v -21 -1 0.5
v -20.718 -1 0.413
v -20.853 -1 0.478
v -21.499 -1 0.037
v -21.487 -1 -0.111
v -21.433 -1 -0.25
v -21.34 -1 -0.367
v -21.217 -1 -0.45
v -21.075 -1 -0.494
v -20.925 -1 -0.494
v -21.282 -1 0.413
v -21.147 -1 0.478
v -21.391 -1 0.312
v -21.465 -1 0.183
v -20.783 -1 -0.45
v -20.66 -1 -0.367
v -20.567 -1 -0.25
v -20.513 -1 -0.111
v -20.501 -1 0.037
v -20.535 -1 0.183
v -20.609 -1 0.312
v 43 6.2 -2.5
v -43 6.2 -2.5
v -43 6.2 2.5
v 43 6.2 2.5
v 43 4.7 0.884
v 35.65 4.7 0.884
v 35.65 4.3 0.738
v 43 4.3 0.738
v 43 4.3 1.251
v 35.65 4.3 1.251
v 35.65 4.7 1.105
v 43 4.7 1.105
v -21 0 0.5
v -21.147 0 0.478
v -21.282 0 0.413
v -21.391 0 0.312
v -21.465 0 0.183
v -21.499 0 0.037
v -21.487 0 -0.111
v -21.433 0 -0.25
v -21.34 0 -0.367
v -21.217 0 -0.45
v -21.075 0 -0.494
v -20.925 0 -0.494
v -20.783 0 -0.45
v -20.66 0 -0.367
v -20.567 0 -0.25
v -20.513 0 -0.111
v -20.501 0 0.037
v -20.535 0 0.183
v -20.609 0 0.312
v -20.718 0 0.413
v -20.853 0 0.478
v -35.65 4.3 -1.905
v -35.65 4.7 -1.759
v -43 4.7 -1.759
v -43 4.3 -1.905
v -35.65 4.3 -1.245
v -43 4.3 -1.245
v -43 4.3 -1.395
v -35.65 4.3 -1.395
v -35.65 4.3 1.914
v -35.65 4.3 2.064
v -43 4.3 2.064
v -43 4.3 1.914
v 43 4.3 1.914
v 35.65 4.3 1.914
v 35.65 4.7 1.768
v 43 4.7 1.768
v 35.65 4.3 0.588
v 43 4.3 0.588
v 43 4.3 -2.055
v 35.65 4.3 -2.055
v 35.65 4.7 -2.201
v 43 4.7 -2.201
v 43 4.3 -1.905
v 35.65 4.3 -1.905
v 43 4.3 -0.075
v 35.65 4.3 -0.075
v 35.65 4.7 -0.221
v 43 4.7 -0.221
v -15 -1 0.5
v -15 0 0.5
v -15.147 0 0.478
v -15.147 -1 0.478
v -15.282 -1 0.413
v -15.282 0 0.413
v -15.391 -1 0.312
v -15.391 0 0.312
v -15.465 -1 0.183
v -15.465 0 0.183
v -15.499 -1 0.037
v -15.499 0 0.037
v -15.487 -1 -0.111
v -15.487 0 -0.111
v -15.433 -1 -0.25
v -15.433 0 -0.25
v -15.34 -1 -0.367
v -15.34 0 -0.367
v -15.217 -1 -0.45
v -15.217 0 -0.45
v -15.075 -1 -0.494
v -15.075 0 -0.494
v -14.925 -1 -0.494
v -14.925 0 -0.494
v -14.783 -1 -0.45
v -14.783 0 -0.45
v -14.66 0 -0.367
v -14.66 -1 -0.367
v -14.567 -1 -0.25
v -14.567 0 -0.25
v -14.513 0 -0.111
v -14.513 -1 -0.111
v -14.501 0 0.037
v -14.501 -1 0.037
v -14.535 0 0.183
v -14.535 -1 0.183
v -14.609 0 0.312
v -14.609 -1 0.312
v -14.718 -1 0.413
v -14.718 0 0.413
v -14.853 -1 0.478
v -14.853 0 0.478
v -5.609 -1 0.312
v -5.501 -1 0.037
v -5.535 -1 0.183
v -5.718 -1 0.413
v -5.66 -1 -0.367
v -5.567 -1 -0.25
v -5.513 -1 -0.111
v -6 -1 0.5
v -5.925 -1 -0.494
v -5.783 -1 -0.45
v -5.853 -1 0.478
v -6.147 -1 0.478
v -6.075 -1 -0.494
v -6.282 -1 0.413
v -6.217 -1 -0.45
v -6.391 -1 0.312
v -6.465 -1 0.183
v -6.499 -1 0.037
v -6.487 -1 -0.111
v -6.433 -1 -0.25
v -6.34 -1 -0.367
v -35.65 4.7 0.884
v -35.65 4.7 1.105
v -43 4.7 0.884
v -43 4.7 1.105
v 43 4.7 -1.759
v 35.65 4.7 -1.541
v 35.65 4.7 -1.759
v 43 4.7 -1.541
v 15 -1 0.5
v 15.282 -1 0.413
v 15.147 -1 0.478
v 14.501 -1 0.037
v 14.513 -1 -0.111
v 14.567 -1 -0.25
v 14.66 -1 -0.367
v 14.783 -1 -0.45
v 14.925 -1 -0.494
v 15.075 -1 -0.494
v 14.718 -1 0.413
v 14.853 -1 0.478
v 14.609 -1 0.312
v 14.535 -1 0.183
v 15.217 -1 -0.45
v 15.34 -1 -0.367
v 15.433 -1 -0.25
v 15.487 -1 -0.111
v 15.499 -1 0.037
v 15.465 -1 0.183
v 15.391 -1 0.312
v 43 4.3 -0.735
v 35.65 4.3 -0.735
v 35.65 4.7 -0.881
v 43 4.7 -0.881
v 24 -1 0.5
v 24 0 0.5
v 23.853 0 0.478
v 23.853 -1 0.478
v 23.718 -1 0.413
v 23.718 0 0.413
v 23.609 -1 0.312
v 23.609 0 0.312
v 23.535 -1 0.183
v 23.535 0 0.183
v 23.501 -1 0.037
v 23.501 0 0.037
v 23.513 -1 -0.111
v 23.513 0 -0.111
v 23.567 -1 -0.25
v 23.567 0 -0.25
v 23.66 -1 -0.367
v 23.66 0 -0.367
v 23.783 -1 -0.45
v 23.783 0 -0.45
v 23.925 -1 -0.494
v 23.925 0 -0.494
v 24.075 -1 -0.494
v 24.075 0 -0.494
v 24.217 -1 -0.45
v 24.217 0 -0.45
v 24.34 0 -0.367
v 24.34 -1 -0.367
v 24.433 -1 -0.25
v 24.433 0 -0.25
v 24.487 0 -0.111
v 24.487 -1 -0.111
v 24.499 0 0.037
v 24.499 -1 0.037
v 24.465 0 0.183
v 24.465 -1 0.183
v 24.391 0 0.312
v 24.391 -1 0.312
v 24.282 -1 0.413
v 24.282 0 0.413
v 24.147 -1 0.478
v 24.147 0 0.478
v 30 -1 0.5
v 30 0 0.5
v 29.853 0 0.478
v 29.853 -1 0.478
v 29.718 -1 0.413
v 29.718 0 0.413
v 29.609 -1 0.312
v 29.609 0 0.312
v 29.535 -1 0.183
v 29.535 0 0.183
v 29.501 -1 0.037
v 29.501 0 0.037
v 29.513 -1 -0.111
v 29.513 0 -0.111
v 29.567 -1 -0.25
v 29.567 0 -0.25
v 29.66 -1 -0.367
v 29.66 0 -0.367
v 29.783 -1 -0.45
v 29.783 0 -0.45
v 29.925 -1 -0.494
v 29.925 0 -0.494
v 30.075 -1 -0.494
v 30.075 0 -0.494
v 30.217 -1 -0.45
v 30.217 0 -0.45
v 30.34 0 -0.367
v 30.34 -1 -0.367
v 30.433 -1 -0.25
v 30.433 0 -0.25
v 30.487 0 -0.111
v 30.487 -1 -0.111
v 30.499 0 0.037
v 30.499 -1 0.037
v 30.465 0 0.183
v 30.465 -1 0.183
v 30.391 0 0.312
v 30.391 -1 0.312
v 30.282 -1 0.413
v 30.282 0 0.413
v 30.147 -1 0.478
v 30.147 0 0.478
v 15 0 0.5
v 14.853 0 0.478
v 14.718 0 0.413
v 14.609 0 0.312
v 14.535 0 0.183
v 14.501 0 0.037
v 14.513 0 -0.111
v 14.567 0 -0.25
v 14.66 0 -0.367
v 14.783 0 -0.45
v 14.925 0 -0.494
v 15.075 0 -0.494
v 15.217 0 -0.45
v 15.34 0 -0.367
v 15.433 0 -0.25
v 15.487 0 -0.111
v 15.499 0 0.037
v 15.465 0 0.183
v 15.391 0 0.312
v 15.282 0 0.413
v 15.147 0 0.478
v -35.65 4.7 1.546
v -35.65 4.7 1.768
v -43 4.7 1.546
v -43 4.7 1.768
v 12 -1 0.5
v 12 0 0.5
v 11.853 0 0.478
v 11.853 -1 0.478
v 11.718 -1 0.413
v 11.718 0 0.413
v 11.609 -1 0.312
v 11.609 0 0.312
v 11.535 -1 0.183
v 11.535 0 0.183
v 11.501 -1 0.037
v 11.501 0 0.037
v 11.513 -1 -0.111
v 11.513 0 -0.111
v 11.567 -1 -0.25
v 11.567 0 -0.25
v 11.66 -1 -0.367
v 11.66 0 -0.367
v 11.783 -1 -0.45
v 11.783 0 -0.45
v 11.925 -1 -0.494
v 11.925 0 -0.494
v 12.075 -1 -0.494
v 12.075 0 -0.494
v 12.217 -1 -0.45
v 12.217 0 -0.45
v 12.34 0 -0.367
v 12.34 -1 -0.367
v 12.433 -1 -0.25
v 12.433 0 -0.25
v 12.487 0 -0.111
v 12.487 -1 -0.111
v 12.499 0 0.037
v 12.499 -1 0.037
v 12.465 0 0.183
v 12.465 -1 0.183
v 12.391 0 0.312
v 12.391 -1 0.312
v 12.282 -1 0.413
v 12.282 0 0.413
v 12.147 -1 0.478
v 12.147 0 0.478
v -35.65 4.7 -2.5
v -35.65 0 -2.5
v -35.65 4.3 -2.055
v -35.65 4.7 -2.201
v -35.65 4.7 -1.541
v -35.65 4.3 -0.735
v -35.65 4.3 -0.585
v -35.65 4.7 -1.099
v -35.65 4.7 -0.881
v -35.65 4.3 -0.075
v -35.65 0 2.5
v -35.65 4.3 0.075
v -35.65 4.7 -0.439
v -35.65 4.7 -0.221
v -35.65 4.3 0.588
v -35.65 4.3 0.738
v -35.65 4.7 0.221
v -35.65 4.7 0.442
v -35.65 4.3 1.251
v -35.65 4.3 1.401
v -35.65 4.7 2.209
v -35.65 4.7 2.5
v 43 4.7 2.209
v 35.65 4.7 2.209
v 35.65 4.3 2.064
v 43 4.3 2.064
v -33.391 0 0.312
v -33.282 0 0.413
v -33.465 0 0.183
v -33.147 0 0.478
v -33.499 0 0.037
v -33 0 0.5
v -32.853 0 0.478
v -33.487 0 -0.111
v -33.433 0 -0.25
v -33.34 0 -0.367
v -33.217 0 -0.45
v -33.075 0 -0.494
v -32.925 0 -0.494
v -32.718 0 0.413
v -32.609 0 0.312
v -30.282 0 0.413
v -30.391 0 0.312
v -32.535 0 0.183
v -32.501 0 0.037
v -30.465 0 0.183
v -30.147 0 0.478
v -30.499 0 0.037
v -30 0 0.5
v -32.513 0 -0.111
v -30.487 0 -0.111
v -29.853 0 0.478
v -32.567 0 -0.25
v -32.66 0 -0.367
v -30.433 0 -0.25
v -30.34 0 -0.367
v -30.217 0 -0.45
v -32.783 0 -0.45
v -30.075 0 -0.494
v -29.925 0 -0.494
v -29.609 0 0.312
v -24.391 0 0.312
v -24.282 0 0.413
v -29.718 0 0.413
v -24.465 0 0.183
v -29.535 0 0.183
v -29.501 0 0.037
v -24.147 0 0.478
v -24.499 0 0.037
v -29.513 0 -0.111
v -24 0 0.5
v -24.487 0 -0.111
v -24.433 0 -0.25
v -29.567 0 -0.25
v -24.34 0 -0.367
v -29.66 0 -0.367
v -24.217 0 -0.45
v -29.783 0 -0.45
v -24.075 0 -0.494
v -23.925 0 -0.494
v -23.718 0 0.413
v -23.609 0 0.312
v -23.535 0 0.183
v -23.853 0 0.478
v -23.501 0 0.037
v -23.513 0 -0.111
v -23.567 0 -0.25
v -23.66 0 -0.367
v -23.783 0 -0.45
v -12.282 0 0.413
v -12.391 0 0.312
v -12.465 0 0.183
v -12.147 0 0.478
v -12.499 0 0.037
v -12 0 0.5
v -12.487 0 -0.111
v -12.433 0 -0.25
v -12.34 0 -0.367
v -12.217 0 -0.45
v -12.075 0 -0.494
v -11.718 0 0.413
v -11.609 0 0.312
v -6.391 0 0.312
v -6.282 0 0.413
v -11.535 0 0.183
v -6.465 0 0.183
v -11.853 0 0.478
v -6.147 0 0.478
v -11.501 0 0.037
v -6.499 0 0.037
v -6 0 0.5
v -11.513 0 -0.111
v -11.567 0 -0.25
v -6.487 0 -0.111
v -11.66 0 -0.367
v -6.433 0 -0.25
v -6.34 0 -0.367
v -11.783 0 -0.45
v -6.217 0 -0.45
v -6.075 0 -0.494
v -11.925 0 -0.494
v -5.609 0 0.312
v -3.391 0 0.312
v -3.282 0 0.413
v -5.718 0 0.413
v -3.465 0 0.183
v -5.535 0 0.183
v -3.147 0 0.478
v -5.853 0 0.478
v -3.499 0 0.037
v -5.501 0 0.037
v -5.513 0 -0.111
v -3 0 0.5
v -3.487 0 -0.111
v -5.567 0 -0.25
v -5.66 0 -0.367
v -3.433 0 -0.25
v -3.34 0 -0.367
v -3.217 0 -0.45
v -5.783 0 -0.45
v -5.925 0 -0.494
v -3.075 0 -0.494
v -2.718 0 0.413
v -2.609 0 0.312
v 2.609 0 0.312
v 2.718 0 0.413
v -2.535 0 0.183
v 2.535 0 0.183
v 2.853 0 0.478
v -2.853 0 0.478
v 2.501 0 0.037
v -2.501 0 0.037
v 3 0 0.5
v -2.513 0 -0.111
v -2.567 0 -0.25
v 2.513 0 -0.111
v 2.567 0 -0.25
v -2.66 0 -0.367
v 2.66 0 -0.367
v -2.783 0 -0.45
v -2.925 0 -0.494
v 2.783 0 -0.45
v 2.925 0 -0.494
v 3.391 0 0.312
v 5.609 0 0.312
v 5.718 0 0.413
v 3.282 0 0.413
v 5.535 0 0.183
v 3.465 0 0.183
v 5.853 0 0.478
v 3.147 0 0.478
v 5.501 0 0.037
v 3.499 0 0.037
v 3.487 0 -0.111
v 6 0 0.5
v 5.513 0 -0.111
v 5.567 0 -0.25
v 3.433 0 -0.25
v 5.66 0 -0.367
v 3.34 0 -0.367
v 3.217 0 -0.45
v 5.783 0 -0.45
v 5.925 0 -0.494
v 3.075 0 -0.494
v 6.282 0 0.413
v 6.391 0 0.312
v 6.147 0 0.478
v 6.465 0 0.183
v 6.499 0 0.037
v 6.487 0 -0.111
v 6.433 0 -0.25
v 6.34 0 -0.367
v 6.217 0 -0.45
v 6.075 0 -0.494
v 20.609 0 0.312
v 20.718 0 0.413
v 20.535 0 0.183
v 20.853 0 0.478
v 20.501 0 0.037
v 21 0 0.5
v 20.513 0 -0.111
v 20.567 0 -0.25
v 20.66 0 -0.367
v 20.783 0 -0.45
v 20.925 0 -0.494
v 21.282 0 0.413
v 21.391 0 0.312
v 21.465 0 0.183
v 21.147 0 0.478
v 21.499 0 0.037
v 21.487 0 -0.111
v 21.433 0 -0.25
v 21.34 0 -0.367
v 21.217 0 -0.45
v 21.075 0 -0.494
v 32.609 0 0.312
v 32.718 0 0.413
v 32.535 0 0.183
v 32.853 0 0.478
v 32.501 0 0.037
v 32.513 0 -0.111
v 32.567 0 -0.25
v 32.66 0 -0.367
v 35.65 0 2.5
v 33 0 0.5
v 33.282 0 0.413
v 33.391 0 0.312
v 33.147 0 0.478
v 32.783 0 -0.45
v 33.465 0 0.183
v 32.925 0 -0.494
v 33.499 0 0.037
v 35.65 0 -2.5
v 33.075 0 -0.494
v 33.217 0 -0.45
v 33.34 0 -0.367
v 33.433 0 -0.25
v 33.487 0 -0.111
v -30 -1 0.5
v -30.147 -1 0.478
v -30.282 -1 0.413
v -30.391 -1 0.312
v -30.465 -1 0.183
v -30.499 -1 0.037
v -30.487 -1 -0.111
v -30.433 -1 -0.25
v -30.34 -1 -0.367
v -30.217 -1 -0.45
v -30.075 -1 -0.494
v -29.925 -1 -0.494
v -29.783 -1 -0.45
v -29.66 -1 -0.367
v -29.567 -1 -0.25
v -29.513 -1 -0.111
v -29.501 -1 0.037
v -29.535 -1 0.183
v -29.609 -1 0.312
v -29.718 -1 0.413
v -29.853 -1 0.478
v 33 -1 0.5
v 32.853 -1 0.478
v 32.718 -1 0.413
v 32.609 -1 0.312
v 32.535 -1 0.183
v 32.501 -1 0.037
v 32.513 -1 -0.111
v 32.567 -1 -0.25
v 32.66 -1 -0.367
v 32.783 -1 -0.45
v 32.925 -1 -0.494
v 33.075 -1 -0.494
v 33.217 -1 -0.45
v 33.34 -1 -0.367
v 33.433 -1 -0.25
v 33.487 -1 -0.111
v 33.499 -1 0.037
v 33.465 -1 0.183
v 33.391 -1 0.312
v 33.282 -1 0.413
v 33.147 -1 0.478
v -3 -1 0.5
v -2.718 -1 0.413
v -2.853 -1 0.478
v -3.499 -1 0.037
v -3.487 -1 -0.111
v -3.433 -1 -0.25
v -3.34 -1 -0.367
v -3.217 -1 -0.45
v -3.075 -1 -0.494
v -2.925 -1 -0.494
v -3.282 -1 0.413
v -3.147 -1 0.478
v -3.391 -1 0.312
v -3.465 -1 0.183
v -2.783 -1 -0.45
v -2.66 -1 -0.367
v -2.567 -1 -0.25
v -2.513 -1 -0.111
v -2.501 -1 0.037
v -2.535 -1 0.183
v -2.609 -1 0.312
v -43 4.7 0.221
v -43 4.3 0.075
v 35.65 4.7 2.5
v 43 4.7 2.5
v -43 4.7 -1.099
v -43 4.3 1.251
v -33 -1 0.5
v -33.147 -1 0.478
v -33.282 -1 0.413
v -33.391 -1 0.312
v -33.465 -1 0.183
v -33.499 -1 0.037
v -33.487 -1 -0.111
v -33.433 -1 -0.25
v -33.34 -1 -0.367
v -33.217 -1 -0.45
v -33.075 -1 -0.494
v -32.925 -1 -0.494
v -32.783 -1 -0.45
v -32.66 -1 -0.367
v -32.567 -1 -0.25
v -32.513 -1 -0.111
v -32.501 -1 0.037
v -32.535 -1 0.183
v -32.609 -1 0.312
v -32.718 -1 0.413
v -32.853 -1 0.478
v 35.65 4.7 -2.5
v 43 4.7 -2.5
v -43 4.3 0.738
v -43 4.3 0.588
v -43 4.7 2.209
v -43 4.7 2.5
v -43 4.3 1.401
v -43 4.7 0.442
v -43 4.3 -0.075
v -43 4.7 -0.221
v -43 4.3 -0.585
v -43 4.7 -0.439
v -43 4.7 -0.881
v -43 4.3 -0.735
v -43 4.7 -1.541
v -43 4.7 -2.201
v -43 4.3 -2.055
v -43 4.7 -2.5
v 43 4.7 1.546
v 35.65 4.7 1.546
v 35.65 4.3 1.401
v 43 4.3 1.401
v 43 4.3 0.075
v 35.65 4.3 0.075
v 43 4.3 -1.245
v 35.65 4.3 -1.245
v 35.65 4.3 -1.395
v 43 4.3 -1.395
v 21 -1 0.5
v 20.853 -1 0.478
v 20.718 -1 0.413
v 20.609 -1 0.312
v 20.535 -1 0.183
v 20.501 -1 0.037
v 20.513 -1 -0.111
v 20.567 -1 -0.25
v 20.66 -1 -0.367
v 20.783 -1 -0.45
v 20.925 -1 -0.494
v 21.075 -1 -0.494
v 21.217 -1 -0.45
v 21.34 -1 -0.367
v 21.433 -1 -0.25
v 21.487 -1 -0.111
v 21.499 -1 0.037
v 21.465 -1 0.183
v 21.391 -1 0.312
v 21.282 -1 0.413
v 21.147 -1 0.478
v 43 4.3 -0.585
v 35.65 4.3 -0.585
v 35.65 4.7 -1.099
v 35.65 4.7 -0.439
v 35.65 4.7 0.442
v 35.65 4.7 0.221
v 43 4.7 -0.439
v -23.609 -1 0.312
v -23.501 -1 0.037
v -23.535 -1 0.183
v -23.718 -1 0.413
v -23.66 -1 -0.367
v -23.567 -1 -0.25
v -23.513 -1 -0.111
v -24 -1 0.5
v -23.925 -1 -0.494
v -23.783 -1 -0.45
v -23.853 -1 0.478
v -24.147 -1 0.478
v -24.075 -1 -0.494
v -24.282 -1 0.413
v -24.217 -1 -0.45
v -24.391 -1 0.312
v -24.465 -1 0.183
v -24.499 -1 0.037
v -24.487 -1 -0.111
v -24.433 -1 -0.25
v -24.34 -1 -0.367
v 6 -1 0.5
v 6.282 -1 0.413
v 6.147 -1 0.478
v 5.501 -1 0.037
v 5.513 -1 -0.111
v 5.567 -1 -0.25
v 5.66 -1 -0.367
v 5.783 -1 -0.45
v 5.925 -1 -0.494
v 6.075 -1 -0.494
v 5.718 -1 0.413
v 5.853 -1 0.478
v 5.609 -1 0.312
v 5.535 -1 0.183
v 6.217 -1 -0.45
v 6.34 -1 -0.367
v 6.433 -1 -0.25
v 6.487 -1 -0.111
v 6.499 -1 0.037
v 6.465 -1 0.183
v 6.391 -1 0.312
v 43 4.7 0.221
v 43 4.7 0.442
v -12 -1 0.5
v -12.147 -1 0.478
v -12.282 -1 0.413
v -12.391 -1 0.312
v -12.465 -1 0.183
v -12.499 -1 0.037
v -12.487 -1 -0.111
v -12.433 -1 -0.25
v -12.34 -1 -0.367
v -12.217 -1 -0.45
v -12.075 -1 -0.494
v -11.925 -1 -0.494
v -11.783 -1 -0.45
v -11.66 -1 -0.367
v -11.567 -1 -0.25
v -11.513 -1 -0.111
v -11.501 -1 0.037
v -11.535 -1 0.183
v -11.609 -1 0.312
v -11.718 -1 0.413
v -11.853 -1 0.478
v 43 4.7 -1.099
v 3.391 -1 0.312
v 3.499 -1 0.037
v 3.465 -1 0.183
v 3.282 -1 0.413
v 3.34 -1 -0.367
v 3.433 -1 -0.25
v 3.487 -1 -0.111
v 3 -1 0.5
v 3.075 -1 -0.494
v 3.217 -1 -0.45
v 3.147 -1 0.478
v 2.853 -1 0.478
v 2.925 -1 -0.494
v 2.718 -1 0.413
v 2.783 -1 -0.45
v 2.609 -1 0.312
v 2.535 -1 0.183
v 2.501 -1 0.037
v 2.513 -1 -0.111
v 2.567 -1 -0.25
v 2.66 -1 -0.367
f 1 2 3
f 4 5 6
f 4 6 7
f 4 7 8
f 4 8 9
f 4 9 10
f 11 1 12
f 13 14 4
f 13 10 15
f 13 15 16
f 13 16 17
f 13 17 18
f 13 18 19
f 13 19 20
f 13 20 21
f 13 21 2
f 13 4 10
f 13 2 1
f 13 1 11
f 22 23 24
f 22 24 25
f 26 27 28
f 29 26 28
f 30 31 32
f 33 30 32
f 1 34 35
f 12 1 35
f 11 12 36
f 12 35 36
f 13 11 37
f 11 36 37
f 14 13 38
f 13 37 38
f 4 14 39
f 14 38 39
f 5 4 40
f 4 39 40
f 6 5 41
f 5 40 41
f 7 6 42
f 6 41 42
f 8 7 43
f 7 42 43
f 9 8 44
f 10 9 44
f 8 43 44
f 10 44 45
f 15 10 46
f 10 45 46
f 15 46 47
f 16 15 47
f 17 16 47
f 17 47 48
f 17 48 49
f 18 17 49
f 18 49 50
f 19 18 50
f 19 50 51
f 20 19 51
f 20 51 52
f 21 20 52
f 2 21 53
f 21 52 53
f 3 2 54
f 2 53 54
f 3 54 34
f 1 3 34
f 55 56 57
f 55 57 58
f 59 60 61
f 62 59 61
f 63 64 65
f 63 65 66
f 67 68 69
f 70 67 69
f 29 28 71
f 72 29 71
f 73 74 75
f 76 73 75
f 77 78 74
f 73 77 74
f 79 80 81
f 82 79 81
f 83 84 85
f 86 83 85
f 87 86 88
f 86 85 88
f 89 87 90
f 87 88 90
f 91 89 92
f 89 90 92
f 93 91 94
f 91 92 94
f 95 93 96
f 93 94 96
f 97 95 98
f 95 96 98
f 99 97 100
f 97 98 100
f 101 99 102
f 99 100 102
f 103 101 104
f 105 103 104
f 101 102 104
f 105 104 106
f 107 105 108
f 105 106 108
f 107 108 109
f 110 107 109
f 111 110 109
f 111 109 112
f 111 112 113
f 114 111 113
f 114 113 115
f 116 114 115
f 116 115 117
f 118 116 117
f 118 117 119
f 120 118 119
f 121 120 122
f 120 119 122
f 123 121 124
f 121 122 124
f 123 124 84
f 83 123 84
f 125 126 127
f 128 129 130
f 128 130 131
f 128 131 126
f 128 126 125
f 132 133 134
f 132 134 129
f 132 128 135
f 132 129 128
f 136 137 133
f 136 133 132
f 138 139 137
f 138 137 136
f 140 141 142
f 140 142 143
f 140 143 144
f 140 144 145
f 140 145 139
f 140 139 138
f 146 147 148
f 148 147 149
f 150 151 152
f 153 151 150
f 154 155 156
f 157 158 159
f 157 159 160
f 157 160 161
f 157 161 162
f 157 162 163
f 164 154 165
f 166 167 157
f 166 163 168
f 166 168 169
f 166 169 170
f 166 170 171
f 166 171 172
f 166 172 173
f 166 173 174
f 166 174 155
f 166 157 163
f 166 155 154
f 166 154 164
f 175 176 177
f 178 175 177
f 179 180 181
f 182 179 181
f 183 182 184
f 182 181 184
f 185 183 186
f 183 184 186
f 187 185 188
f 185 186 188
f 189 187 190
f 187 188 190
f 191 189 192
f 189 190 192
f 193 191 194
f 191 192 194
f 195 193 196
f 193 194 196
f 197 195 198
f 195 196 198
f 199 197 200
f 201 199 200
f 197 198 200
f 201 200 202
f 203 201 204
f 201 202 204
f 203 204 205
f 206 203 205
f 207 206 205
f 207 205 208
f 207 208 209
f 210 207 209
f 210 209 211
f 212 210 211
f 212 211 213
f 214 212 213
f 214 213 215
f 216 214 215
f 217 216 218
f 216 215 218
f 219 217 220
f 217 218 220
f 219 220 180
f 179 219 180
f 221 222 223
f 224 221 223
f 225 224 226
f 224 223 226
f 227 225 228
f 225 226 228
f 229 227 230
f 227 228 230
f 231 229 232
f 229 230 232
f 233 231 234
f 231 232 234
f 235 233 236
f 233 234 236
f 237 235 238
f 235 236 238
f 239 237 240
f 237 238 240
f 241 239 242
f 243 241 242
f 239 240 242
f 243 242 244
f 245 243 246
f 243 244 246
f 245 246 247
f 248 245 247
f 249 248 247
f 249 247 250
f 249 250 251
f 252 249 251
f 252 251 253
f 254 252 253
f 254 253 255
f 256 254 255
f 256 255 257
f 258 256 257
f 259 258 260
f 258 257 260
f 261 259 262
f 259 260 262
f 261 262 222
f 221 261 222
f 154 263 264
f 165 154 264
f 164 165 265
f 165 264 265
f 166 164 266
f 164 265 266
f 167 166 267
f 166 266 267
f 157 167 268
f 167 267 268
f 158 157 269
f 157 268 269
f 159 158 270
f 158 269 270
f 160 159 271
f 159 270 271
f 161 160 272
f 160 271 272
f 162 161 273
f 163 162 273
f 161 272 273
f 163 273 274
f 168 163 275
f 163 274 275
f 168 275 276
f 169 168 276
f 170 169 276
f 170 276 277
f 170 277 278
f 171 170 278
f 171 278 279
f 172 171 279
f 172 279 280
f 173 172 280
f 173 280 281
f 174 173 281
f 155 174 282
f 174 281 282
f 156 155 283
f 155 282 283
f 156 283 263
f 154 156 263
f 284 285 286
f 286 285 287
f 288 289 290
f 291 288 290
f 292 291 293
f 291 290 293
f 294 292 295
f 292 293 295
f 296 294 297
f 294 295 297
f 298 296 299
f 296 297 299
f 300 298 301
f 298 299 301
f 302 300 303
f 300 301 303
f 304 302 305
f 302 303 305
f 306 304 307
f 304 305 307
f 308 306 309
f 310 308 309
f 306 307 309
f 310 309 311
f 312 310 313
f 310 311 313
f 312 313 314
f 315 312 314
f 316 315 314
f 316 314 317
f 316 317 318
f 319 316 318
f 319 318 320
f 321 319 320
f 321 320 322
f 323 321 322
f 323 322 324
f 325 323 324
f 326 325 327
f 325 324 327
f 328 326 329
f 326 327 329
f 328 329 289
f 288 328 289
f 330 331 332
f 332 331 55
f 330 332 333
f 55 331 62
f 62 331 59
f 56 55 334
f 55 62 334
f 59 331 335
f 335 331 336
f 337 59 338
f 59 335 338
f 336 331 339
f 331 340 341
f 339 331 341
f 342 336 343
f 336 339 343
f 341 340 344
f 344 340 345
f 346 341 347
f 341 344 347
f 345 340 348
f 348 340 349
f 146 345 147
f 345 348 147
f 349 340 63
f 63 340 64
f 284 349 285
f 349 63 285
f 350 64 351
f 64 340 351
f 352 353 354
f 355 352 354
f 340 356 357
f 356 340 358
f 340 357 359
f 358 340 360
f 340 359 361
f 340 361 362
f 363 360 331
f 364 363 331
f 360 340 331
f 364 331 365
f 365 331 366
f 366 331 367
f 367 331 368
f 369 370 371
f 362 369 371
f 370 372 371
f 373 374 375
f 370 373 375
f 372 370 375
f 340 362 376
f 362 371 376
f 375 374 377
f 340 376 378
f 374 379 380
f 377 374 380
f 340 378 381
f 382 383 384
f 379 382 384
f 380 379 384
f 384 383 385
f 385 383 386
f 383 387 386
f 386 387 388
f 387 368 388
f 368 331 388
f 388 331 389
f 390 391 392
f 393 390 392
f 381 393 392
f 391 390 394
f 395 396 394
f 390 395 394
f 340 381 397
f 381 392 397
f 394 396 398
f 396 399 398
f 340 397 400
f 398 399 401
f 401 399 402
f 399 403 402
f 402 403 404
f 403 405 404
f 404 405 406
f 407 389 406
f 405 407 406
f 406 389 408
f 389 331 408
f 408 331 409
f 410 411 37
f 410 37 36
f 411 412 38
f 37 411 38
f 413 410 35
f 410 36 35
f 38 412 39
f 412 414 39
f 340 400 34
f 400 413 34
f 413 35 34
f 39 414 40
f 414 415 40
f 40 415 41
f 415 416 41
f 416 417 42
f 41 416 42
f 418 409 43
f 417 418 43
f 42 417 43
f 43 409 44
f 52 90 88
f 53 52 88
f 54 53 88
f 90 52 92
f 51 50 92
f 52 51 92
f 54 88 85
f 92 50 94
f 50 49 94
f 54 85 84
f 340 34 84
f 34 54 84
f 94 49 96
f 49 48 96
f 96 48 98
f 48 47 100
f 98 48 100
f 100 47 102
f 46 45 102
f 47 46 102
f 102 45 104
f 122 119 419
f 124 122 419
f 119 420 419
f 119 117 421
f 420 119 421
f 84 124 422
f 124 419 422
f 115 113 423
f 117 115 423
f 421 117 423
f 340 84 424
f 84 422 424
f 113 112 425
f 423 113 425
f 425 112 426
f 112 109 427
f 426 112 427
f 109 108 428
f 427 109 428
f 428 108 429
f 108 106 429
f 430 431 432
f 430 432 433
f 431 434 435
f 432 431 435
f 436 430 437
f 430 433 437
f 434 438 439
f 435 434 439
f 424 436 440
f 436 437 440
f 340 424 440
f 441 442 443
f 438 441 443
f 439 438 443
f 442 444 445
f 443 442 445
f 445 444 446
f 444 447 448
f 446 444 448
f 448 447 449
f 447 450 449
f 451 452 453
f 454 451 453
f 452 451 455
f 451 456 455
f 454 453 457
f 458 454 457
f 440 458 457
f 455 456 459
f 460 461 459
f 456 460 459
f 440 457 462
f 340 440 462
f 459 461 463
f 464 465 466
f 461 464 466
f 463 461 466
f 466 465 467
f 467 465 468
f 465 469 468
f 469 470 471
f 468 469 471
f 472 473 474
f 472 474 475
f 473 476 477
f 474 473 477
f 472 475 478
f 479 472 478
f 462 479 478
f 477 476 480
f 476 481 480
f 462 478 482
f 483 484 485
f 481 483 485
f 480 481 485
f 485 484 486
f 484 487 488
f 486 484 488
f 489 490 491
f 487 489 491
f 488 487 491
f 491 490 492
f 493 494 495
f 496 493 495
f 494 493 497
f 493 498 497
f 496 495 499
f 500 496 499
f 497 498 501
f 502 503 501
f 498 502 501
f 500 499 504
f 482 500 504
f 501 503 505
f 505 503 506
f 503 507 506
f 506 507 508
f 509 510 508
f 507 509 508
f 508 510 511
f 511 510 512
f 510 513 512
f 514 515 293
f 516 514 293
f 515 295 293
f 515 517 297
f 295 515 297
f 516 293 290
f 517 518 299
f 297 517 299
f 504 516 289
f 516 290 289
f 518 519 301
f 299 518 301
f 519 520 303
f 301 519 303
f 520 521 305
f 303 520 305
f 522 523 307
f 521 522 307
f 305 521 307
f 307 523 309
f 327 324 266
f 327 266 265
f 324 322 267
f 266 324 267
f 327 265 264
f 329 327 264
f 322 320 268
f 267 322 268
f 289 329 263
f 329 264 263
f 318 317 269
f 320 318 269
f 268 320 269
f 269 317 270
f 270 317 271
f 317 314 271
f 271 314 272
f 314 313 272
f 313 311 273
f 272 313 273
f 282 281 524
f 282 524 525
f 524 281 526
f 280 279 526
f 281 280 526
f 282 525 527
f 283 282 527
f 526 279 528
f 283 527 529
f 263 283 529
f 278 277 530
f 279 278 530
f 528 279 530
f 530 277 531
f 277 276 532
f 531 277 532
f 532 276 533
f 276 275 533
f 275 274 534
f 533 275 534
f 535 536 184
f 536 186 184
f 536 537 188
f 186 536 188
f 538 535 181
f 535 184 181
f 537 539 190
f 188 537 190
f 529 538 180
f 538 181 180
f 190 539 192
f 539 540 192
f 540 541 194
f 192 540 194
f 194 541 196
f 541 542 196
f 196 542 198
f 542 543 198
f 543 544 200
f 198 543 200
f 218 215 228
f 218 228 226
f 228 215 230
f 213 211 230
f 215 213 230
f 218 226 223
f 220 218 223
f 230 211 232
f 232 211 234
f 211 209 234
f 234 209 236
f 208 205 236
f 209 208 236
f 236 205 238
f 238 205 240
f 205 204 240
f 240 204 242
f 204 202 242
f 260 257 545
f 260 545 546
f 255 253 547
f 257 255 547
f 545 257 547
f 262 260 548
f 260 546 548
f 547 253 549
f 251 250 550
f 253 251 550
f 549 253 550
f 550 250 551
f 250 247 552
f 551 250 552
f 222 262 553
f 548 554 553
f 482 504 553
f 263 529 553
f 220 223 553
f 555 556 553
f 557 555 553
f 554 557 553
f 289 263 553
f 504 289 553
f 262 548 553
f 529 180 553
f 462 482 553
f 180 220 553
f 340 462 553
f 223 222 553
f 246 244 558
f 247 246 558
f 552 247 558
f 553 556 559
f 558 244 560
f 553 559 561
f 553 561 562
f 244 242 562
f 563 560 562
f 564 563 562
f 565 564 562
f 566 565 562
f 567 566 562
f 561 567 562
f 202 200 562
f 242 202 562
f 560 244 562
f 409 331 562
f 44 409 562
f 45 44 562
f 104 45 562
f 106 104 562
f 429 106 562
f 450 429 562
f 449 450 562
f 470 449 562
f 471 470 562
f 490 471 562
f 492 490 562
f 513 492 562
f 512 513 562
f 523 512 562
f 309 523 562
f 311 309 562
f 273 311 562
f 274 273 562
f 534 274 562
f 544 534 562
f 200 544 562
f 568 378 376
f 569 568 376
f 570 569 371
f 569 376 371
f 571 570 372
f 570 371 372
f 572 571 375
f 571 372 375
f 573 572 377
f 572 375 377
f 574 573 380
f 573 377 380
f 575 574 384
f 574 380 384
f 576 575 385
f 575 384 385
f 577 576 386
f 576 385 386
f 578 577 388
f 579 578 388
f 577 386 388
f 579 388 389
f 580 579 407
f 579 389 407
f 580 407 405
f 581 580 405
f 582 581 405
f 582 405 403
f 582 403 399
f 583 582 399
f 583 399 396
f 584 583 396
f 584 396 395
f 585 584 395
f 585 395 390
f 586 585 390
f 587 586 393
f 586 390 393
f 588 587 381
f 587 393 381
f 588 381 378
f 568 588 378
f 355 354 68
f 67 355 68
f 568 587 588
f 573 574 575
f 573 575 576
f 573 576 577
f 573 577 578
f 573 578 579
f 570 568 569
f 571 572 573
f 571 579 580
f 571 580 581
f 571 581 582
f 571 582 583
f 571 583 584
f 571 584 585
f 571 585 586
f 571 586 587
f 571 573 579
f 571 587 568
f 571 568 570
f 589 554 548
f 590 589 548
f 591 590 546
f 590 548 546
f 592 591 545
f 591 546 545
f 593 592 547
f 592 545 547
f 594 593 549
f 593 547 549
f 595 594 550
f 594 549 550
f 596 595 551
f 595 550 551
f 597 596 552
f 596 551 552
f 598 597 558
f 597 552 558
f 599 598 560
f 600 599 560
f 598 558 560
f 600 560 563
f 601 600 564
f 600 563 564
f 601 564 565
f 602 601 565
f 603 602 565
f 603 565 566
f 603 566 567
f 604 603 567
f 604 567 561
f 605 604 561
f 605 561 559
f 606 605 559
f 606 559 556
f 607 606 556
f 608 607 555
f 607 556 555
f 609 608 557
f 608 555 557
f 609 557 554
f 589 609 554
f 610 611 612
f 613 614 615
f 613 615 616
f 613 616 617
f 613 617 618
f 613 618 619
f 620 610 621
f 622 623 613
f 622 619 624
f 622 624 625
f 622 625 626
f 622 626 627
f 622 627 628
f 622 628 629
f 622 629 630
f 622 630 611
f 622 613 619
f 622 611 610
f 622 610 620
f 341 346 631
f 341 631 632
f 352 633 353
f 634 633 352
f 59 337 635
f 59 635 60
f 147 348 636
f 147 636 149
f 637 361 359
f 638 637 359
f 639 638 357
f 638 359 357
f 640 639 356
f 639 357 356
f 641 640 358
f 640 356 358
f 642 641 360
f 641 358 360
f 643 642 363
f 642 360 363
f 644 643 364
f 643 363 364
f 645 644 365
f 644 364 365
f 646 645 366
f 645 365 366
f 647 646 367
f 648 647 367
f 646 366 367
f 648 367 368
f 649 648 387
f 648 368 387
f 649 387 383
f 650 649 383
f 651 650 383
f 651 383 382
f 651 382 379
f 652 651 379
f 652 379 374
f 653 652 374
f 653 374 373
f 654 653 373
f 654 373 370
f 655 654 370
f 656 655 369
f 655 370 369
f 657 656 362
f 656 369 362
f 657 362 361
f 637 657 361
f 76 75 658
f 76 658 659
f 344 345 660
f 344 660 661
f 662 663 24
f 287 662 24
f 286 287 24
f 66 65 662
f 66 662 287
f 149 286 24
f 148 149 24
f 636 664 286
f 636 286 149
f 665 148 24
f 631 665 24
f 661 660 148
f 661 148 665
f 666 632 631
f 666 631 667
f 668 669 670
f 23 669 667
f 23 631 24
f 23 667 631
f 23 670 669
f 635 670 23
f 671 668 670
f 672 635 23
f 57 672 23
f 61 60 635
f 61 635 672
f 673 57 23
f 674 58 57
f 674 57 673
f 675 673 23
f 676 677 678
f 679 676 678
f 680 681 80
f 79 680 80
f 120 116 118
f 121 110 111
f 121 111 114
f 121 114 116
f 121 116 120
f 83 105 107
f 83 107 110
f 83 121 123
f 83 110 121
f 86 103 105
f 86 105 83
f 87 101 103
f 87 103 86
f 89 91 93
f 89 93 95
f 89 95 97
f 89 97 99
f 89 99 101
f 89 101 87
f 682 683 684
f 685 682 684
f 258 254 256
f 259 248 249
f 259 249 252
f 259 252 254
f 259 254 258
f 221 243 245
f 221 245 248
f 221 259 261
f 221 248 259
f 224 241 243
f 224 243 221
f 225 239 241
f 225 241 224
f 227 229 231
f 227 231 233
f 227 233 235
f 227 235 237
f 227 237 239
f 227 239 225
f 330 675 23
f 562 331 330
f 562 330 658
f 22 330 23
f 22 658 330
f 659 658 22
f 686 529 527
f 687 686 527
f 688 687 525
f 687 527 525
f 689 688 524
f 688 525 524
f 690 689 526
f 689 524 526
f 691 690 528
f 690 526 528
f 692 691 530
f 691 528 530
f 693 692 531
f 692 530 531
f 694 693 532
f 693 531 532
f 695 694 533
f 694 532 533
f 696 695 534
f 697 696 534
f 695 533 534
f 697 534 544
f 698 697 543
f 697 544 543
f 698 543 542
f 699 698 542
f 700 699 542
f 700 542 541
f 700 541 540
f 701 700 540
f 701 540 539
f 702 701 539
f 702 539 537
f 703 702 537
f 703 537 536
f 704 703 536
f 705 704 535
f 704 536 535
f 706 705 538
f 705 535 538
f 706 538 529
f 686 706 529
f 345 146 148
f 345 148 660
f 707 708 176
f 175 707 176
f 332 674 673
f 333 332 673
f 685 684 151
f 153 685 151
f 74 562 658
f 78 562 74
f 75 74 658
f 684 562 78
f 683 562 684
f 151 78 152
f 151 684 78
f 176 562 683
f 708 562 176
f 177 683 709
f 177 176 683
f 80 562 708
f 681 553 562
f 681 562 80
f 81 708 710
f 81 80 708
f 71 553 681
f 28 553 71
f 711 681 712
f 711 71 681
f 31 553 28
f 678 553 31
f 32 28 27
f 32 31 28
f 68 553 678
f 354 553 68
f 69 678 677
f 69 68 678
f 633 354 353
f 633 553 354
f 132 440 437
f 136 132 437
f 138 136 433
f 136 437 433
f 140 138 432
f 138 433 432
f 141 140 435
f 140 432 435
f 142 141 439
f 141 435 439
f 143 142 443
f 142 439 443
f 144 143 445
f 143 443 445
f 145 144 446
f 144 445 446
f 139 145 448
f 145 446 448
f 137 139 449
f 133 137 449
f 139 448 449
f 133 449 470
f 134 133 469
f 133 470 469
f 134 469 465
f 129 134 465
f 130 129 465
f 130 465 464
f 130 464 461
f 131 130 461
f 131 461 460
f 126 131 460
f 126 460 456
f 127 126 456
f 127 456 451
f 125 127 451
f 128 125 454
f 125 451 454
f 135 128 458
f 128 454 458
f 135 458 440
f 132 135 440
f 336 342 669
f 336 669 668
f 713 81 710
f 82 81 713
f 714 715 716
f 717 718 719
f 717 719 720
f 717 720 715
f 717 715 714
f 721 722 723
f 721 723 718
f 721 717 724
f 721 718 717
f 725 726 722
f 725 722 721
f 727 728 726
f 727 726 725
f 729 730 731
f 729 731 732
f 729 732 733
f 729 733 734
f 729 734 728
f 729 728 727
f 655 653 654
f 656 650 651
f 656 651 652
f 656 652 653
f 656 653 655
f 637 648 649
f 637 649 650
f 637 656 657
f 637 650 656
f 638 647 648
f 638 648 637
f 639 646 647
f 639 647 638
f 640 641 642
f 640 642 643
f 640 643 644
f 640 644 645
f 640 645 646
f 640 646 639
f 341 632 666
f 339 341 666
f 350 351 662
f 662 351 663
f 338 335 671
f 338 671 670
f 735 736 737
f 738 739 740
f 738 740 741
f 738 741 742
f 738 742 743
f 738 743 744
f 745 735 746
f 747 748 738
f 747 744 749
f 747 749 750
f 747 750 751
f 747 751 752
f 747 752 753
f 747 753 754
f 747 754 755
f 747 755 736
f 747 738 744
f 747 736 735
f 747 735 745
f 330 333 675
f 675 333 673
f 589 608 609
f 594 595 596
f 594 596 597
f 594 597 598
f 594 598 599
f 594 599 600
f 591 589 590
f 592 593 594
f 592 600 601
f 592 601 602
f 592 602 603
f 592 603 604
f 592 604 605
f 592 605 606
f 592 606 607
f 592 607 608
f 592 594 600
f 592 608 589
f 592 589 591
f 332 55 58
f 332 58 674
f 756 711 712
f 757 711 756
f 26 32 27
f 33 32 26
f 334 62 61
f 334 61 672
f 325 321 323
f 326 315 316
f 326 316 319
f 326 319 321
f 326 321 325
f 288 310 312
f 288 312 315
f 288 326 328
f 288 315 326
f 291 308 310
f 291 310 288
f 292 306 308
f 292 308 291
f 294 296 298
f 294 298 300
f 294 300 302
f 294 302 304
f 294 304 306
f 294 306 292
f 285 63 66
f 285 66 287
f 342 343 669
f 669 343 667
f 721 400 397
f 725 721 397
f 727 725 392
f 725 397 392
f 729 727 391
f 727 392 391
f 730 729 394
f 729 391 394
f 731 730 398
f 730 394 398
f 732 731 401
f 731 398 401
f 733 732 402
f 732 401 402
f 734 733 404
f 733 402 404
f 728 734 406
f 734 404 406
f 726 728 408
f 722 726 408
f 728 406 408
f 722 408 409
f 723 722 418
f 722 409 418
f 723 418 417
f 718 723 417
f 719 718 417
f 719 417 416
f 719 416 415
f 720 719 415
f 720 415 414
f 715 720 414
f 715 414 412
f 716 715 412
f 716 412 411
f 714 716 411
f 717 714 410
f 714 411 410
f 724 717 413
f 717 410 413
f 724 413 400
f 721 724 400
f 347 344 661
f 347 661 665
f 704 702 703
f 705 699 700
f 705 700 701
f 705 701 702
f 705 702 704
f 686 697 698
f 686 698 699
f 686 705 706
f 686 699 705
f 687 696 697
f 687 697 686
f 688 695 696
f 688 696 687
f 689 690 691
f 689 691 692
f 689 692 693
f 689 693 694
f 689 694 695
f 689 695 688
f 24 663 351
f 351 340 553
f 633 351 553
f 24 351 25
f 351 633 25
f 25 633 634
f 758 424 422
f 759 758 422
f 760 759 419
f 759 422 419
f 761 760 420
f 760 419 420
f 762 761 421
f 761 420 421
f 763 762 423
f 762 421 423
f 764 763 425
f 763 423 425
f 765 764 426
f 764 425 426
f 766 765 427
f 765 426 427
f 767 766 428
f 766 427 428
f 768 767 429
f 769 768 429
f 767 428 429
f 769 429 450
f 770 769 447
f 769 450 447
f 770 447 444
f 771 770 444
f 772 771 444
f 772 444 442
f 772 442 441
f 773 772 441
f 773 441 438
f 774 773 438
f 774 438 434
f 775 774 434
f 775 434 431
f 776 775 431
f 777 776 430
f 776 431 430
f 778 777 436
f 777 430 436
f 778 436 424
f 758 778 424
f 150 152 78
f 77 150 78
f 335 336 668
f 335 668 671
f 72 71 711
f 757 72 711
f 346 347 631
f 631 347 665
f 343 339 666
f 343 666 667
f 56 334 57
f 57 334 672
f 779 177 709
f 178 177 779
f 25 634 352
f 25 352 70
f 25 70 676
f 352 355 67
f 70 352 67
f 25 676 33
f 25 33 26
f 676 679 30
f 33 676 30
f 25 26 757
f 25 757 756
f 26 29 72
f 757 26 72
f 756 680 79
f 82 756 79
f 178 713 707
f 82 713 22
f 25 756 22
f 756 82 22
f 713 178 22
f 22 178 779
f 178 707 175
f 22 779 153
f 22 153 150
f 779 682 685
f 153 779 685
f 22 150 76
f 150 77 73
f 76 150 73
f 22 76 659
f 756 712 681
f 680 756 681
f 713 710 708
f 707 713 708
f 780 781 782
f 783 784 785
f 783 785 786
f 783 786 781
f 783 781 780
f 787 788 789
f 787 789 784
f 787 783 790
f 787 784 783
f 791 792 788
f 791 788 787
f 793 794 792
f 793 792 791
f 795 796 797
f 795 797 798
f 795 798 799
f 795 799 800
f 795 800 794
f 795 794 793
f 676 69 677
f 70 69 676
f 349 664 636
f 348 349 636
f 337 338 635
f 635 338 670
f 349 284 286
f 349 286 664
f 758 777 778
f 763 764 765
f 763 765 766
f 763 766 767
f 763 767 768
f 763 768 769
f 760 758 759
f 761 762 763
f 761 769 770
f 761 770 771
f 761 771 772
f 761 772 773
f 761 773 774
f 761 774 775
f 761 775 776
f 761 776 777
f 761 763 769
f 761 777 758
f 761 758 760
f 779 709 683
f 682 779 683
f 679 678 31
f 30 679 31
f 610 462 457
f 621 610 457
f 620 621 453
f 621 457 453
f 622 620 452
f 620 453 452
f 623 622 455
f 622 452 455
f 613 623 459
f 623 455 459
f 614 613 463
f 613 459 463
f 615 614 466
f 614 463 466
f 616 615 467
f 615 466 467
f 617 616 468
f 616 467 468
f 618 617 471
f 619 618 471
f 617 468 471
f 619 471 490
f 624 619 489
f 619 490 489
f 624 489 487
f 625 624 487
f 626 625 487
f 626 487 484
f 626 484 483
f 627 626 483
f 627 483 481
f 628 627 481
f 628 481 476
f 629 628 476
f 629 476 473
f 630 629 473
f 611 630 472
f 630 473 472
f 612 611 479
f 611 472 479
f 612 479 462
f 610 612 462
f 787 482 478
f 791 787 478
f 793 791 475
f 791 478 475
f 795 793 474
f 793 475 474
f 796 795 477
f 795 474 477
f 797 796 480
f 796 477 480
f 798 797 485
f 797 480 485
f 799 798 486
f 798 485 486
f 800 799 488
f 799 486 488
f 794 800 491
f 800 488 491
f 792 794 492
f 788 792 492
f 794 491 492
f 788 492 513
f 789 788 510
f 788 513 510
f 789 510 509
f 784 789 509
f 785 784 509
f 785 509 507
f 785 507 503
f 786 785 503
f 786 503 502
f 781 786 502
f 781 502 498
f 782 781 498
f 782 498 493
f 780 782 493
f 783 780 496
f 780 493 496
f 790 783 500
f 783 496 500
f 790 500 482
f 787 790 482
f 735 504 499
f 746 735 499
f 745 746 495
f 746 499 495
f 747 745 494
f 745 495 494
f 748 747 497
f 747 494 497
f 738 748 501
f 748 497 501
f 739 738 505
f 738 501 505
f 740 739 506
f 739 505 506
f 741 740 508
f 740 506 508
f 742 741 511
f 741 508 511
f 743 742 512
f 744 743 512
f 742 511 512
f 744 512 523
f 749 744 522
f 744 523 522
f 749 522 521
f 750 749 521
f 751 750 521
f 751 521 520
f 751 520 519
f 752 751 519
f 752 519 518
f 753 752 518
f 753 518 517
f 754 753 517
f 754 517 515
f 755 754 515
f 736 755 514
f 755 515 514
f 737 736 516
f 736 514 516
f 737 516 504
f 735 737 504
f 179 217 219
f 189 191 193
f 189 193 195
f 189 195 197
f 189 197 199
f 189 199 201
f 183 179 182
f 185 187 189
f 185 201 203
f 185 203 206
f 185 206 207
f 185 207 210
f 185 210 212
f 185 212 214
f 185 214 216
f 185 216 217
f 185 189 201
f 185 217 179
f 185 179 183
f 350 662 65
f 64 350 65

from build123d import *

# Parameters (mm, degrees)
SKETCH1_W                       = 86
SKETCH1_H                       = 5
BOSS_EXTRUDE1_DEPTH             = 6.2
SKETCH2_W                       = 7.35
SKETCH2_H                       = 4.7
CUT_EXTRUDE1_DEPTH              = 10
SKETCH3_R                       = 0.5
FIRST_HOLD_DOWN_CYLINDERS_DEPTH = 1
LPATTERN1_COUNT                 = 5
LPATTERN1_PITCH                 = 9
LPATTERN1_COL_COUNT             = 4
LPATTERN1_COL_PITCH             = 9
FIRST_RIDGE_DEPTH               = 7.35
RACK_LEFT_PATTERN_COUNT         = 4
RACK_LEFT_PATTERN_PITCH         = 0.66294
RACK_LEFT_PATTERN_COL_COUNT     = 4
RACK_LEFT_PATTERN_COL_PITCH     = 0.66
MIRROR2_COPY_1_DEPTH            = 7.35
MIRROR2_COPY_2_DEPTH            = 7.35
MIRROR2_COPY_3_DEPTH            = 7.35
MIRROR2_COPY_4_DEPTH            = 7.35
MIRROR2_COPY_5_DEPTH            = 7.35
MIRROR2_COPY_6_DEPTH            = 7.35


with BuildPart() as part:
    # Sketch1 → Boss-Extrude1 (new body)
    with BuildSketch(Plane(origin=(0, 0, 0), x_dir=(1, 0, 0), z_dir=(0, 1, 0))):
        Rectangle(SKETCH1_W, SKETCH1_H)
    extrude(amount=BOSS_EXTRUDE1_DEPTH)

    # Sketch2 → Cut-Extrude1 (cut)
    with BuildSketch(Plane.XY.offset(2.5)):
        with Locations((39.325, 2.35)):
            Rectangle(SKETCH2_W, SKETCH2_H)
    cut_extrude1 = extrude(amount=-CUT_EXTRUDE1_DEPTH, mode=Mode.SUBTRACT)

    # Mirror1: Cut-Extrude1 across plane
    add(cut_extrude1.mirror(Plane(origin=(0, 0, 0), x_dir=(0, 0, 1), z_dir=(1, 0, 0))), mode=Mode.SUBTRACT)

    # Sketch3 → First hold-down cylinders (add)
    with BuildSketch(Plane.XZ):
        with Locations(Location((-3, 0, 0), (0, 0, 90))):
            Circle(SKETCH3_R)
        with Locations(Location((-6, 0, 0), (0, 0, 90))):
            Circle(SKETCH3_R)
    first_hold_down_cylinders = extrude(amount=FIRST_HOLD_DOWN_CYLINDERS_DEPTH)

    # LPattern1: First hold-down cylinders ×5
    with Locations(*[(i * LPATTERN1_PITCH, 0, 0) for i in range(1, LPATTERN1_COUNT)]):
        add(first_hold_down_cylinders)

    # LPattern1 col: First hold-down cylinders ×4
    with Locations(*[(-i * LPATTERN1_COL_PITCH, 0, 0) for i in range(1, LPATTERN1_COL_COUNT)]):
        add(first_hold_down_cylinders)

    # Sketch4 → First Ridge (add)
    with BuildSketch(Plane(origin=(43, 0, 0), x_dir=(0, 0, -1), z_dir=(1, 0, 0))):
        Polygon((0.220588094, 4.7), (-0.220588094, 4.7), (-0.075, 4.3), (0.075, 4.3), align=None)
    first_ridge = extrude(amount=-FIRST_RIDGE_DEPTH)

    # Rack Left Pattern: First Ridge ×4
    with Locations(*[(0, 0, i * RACK_LEFT_PATTERN_PITCH) for i in range(1, RACK_LEFT_PATTERN_COUNT)]):
        add(first_ridge)

    # Rack Left Pattern col: First Ridge ×4
    with Locations(*[(0, 0, -i * RACK_LEFT_PATTERN_COL_PITCH) for i in range(1, RACK_LEFT_PATTERN_COL_COUNT)]):
        add(first_ridge)

    # Mirror2: First Ridge across plane
    add(first_ridge.mirror(Plane(origin=(0, 0, 0), x_dir=(0, 0, 1), z_dir=(1, 0, 0))))

    # Mirror2 copy 1 sketch → Mirror2 copy 1 (add)
    with BuildSketch(Plane(origin=(-43, 0, 0.66294), x_dir=(0, 0, -1), z_dir=(-1, 0, 0))):
        Polygon((0.220588094, -4.7), (-0.220588094, -4.7), (-0.075, -4.3), (0.075, -4.3), align=None)
    extrude(amount=-MIRROR2_COPY_1_DEPTH)

    # Mirror2 copy 2 sketch → Mirror2 copy 2 (add)
    with BuildSketch(Plane(origin=(-43, 0, 1.32588), x_dir=(0, 0, -1), z_dir=(-1, 0, 0))):
        Polygon((0.220588094, -4.7), (-0.220588094, -4.7), (-0.075, -4.3), (0.075, -4.3), align=None)
    extrude(amount=-MIRROR2_COPY_2_DEPTH)

    # Mirror2 copy 3 sketch → Mirror2 copy 3 (add)
    with BuildSketch(Plane(origin=(-43, 0, 1.98882), x_dir=(0, 0, -1), z_dir=(-1, 0, 0))):
        Polygon((0.220588094, -4.7), (-0.220588094, -4.7), (-0.075, -4.3), (0.075, -4.3), align=None)
    extrude(amount=-MIRROR2_COPY_3_DEPTH)

    # Mirror2 copy 4 sketch → Mirror2 copy 4 (add)
    with BuildSketch(Plane(origin=(-43, 0, -0.66), x_dir=(0, 0, -1), z_dir=(-1, 0, 0))):
        Polygon((0.220588094, -4.7), (-0.220588094, -4.7), (-0.075, -4.3), (0.075, -4.3), align=None)
    extrude(amount=-MIRROR2_COPY_4_DEPTH)

    # Mirror2 copy 5 sketch → Mirror2 copy 5 (add)
    with BuildSketch(Plane(origin=(-43, 0, -1.32), x_dir=(0, 0, -1), z_dir=(-1, 0, 0))):
        Polygon((0.220588094, -4.7), (-0.220588094, -4.7), (-0.075, -4.3), (0.075, -4.3), align=None)
    extrude(amount=-MIRROR2_COPY_5_DEPTH)

    # Mirror2 copy 6 sketch → Mirror2 copy 6 (add)
    with BuildSketch(Plane(origin=(-43, 0, -1.98), x_dir=(0, 0, -1), z_dir=(-1, 0, 0))):
        Polygon((0.220588094, -4.7), (-0.220588094, -4.7), (-0.075, -4.3), (0.075, -4.3), align=None)
    extrude(amount=-MIRROR2_COPY_6_DEPTH)


solid = part.part
